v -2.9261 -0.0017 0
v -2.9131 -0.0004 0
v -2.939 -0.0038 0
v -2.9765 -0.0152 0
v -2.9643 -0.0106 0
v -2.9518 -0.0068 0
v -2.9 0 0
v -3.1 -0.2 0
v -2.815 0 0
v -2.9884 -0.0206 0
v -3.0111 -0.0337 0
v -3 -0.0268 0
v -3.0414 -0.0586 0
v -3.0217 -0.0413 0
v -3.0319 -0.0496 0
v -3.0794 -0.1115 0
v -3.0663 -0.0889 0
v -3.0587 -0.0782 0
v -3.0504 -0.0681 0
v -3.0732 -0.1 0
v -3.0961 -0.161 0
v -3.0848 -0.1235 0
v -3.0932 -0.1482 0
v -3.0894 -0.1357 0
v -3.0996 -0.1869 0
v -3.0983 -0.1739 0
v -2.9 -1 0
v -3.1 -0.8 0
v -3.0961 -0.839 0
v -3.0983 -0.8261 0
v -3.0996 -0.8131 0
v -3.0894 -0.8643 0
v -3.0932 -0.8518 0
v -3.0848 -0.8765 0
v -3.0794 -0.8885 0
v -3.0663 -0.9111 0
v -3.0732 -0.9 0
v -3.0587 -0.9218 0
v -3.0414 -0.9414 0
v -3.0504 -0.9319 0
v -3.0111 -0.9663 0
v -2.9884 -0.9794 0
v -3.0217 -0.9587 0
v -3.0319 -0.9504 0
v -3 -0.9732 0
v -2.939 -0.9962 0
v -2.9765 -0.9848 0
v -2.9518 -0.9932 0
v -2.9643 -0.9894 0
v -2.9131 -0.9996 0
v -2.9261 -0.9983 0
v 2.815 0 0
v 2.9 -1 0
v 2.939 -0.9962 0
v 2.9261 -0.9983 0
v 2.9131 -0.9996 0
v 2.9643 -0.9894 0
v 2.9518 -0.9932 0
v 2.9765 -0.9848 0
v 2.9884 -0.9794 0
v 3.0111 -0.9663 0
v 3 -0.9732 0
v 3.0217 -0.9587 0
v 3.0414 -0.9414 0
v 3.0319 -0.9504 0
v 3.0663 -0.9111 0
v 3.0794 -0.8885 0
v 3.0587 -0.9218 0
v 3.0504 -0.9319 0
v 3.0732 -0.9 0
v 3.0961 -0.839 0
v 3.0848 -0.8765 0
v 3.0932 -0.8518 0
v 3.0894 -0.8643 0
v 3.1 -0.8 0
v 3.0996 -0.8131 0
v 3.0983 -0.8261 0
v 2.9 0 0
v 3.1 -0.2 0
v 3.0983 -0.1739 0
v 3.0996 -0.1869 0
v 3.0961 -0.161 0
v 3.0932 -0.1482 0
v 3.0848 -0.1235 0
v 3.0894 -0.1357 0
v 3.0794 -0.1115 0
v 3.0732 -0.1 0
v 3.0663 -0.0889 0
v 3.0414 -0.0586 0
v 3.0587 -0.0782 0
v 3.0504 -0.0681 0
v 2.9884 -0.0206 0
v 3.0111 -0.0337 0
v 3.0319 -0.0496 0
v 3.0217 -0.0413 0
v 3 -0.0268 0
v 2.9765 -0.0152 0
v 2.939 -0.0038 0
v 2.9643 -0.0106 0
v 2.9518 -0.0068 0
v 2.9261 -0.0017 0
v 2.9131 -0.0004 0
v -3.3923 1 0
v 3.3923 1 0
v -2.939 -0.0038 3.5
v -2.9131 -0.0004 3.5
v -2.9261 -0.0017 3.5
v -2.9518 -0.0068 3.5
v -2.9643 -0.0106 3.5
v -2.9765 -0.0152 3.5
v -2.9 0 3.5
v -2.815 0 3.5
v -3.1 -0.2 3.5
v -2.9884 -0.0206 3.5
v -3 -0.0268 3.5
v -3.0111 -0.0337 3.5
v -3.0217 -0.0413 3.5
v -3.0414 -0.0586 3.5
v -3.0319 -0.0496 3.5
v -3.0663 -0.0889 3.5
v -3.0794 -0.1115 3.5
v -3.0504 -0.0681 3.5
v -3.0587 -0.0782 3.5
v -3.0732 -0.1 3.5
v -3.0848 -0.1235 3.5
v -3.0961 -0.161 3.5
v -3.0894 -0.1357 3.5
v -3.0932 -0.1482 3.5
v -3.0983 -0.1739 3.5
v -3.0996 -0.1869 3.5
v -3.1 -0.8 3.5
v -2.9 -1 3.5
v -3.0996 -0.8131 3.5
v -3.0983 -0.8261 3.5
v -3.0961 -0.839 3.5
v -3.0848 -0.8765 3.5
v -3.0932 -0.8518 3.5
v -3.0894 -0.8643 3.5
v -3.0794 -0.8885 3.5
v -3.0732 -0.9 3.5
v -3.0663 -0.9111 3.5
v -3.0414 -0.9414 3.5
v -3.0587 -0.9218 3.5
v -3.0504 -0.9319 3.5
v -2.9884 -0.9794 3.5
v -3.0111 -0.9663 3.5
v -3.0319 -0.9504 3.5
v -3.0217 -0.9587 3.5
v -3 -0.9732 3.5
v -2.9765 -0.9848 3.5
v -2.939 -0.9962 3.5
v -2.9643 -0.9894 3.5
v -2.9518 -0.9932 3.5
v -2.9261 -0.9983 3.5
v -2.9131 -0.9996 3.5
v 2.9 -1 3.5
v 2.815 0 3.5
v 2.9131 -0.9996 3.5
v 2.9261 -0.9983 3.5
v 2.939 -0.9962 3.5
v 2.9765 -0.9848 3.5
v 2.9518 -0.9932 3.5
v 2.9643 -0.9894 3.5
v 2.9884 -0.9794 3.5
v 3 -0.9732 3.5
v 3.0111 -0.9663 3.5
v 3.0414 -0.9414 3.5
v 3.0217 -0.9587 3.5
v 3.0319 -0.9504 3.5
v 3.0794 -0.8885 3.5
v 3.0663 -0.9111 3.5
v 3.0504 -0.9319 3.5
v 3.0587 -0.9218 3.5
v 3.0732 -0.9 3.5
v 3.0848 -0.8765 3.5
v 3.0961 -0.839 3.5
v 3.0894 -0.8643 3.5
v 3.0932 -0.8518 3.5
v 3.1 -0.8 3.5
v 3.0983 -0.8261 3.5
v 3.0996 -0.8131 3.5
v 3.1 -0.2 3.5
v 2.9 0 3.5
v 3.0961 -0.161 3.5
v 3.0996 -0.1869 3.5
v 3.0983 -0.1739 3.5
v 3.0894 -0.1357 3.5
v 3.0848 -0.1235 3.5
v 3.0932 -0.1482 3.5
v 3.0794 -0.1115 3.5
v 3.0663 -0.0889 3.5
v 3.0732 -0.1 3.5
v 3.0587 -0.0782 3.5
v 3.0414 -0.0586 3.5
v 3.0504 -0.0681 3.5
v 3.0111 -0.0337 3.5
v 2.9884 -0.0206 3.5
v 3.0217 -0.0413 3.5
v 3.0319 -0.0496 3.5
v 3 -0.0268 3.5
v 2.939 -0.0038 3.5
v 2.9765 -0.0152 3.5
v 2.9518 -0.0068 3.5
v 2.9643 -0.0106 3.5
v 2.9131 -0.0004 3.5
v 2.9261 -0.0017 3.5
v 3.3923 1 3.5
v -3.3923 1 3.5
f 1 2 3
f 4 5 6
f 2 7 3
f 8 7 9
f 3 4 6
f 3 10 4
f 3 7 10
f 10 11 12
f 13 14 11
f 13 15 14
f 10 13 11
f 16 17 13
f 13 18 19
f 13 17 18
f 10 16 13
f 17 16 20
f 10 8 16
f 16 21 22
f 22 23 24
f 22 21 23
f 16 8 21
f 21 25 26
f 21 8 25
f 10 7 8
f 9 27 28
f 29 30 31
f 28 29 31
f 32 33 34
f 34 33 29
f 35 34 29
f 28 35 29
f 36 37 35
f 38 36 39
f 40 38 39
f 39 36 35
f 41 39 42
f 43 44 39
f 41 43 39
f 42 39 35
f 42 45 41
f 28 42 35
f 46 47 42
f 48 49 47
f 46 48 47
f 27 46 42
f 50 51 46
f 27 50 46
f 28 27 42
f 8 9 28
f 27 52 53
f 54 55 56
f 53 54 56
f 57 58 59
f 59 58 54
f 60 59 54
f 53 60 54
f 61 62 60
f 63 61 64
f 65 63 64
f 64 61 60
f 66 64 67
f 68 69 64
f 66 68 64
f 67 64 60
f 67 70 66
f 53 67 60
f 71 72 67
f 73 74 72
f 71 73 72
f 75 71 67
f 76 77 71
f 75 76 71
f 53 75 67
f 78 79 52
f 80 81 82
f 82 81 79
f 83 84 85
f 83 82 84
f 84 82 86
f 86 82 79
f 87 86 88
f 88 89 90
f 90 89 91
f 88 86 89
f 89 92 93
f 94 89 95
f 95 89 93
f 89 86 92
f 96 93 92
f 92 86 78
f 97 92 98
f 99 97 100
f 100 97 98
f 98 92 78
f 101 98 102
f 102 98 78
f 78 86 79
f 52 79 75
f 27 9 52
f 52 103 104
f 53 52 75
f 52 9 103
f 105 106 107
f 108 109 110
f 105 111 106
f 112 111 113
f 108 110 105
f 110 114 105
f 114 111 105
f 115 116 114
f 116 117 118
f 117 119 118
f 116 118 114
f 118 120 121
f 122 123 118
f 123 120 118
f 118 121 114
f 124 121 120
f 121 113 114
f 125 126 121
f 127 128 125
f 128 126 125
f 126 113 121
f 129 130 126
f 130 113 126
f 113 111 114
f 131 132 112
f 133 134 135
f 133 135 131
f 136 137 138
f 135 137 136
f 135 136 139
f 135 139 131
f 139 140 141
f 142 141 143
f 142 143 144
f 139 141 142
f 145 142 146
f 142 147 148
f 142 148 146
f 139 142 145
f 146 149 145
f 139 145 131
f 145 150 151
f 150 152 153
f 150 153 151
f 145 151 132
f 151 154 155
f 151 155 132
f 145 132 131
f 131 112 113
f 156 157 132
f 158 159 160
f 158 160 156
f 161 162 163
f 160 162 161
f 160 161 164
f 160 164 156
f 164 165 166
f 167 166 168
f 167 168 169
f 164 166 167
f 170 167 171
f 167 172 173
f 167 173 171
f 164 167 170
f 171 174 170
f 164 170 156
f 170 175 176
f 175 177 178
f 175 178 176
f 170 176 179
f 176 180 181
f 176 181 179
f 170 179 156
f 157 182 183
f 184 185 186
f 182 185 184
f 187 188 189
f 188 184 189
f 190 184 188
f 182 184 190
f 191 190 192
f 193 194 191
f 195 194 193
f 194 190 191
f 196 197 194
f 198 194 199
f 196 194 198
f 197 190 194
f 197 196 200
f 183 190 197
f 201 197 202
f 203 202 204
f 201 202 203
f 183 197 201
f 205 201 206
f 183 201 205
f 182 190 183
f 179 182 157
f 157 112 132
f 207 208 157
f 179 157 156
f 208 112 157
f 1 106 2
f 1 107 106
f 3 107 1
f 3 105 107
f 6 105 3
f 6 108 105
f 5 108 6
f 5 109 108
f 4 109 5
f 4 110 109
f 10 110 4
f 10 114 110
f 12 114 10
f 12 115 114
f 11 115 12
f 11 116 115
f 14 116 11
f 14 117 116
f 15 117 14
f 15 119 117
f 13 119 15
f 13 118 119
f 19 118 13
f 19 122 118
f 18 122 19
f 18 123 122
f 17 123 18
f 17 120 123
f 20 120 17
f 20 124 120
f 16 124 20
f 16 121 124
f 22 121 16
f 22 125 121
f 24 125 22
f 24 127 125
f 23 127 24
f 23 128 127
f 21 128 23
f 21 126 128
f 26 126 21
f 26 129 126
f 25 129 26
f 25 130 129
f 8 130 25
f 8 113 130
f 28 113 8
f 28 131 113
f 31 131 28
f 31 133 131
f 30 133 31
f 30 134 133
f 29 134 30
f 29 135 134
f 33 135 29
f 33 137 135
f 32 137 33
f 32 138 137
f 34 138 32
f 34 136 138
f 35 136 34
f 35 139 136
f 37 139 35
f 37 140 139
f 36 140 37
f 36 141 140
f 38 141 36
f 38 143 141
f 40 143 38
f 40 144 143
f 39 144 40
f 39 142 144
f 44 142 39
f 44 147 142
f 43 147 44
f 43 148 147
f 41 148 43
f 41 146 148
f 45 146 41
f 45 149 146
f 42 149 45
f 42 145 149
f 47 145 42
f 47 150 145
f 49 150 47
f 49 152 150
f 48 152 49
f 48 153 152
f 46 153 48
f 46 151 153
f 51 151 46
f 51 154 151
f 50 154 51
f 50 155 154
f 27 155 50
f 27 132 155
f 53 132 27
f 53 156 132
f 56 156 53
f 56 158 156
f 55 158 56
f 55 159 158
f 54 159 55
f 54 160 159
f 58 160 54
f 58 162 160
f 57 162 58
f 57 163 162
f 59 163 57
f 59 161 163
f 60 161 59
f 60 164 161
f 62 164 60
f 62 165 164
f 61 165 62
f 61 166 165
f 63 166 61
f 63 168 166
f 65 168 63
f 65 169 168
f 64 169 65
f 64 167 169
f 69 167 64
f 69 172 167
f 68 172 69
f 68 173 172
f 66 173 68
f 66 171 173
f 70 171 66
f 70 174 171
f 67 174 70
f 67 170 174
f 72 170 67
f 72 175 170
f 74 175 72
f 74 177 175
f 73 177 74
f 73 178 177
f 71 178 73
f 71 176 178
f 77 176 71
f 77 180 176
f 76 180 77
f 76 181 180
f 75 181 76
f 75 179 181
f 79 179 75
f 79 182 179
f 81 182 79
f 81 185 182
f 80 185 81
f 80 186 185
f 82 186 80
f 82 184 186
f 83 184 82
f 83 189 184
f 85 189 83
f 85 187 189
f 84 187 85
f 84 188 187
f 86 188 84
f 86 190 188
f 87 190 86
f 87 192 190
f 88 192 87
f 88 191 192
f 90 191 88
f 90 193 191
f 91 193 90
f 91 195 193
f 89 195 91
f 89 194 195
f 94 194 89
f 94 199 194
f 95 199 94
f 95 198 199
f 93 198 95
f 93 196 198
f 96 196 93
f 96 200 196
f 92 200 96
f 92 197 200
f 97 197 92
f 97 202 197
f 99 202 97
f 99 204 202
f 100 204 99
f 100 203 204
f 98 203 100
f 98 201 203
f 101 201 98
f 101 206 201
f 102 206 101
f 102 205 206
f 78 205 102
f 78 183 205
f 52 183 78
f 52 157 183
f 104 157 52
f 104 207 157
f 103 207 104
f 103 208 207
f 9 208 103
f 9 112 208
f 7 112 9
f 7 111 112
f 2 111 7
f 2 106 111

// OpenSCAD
// Extrusion depth is controlled in 3.5 mm blocks.

$fn = 96;

NUM_BLKS = 1;            // User-configurable depth blocks
BLK_DEPTH_MM = 3.5;      // One block = 3.5 mm

MID_WIDTH_MM = 5.63;
BOTTOM_WIDTH_MM = 6.20;
HALF_HEIGHT_MM = 1.00;
SIDE_ANGLE_DEG = 60;
R_MM = 0.20;

EXTRUDE_DEPTH_MM = NUM_BLKS * BLK_DEPTH_MM;
TOP_WIDTH_MM = MID_WIDTH_MM + 2 * (HALF_HEIGHT_MM / tan(SIDE_ANGLE_DEG));

linear_extrude(height = EXTRUDE_DEPTH_MM)
    profile_2d();

module profile_2d() {
    union() {
        // Upper section (sharp corners at the top, mirrored sides)
        polygon(points = [
            [-TOP_WIDTH_MM / 2,  HALF_HEIGHT_MM],
            [ TOP_WIDTH_MM / 2,  HALF_HEIGHT_MM],
            [ MID_WIDTH_MM / 2,  0],
            [-MID_WIDTH_MM / 2,  0]
        ]);

        // Lower section with 0.20 mm filleted corners
        offset(r = R_MM)
            offset(delta = -R_MM)
                polygon(points = [
                    [-BOTTOM_WIDTH_MM / 2,  0],
                    [ BOTTOM_WIDTH_MM / 2,  0],
                    [ BOTTOM_WIDTH_MM / 2, -HALF_HEIGHT_MM],
                    [-BOTTOM_WIDTH_MM / 2, -HALF_HEIGHT_MM]
                ]);
    }
}
